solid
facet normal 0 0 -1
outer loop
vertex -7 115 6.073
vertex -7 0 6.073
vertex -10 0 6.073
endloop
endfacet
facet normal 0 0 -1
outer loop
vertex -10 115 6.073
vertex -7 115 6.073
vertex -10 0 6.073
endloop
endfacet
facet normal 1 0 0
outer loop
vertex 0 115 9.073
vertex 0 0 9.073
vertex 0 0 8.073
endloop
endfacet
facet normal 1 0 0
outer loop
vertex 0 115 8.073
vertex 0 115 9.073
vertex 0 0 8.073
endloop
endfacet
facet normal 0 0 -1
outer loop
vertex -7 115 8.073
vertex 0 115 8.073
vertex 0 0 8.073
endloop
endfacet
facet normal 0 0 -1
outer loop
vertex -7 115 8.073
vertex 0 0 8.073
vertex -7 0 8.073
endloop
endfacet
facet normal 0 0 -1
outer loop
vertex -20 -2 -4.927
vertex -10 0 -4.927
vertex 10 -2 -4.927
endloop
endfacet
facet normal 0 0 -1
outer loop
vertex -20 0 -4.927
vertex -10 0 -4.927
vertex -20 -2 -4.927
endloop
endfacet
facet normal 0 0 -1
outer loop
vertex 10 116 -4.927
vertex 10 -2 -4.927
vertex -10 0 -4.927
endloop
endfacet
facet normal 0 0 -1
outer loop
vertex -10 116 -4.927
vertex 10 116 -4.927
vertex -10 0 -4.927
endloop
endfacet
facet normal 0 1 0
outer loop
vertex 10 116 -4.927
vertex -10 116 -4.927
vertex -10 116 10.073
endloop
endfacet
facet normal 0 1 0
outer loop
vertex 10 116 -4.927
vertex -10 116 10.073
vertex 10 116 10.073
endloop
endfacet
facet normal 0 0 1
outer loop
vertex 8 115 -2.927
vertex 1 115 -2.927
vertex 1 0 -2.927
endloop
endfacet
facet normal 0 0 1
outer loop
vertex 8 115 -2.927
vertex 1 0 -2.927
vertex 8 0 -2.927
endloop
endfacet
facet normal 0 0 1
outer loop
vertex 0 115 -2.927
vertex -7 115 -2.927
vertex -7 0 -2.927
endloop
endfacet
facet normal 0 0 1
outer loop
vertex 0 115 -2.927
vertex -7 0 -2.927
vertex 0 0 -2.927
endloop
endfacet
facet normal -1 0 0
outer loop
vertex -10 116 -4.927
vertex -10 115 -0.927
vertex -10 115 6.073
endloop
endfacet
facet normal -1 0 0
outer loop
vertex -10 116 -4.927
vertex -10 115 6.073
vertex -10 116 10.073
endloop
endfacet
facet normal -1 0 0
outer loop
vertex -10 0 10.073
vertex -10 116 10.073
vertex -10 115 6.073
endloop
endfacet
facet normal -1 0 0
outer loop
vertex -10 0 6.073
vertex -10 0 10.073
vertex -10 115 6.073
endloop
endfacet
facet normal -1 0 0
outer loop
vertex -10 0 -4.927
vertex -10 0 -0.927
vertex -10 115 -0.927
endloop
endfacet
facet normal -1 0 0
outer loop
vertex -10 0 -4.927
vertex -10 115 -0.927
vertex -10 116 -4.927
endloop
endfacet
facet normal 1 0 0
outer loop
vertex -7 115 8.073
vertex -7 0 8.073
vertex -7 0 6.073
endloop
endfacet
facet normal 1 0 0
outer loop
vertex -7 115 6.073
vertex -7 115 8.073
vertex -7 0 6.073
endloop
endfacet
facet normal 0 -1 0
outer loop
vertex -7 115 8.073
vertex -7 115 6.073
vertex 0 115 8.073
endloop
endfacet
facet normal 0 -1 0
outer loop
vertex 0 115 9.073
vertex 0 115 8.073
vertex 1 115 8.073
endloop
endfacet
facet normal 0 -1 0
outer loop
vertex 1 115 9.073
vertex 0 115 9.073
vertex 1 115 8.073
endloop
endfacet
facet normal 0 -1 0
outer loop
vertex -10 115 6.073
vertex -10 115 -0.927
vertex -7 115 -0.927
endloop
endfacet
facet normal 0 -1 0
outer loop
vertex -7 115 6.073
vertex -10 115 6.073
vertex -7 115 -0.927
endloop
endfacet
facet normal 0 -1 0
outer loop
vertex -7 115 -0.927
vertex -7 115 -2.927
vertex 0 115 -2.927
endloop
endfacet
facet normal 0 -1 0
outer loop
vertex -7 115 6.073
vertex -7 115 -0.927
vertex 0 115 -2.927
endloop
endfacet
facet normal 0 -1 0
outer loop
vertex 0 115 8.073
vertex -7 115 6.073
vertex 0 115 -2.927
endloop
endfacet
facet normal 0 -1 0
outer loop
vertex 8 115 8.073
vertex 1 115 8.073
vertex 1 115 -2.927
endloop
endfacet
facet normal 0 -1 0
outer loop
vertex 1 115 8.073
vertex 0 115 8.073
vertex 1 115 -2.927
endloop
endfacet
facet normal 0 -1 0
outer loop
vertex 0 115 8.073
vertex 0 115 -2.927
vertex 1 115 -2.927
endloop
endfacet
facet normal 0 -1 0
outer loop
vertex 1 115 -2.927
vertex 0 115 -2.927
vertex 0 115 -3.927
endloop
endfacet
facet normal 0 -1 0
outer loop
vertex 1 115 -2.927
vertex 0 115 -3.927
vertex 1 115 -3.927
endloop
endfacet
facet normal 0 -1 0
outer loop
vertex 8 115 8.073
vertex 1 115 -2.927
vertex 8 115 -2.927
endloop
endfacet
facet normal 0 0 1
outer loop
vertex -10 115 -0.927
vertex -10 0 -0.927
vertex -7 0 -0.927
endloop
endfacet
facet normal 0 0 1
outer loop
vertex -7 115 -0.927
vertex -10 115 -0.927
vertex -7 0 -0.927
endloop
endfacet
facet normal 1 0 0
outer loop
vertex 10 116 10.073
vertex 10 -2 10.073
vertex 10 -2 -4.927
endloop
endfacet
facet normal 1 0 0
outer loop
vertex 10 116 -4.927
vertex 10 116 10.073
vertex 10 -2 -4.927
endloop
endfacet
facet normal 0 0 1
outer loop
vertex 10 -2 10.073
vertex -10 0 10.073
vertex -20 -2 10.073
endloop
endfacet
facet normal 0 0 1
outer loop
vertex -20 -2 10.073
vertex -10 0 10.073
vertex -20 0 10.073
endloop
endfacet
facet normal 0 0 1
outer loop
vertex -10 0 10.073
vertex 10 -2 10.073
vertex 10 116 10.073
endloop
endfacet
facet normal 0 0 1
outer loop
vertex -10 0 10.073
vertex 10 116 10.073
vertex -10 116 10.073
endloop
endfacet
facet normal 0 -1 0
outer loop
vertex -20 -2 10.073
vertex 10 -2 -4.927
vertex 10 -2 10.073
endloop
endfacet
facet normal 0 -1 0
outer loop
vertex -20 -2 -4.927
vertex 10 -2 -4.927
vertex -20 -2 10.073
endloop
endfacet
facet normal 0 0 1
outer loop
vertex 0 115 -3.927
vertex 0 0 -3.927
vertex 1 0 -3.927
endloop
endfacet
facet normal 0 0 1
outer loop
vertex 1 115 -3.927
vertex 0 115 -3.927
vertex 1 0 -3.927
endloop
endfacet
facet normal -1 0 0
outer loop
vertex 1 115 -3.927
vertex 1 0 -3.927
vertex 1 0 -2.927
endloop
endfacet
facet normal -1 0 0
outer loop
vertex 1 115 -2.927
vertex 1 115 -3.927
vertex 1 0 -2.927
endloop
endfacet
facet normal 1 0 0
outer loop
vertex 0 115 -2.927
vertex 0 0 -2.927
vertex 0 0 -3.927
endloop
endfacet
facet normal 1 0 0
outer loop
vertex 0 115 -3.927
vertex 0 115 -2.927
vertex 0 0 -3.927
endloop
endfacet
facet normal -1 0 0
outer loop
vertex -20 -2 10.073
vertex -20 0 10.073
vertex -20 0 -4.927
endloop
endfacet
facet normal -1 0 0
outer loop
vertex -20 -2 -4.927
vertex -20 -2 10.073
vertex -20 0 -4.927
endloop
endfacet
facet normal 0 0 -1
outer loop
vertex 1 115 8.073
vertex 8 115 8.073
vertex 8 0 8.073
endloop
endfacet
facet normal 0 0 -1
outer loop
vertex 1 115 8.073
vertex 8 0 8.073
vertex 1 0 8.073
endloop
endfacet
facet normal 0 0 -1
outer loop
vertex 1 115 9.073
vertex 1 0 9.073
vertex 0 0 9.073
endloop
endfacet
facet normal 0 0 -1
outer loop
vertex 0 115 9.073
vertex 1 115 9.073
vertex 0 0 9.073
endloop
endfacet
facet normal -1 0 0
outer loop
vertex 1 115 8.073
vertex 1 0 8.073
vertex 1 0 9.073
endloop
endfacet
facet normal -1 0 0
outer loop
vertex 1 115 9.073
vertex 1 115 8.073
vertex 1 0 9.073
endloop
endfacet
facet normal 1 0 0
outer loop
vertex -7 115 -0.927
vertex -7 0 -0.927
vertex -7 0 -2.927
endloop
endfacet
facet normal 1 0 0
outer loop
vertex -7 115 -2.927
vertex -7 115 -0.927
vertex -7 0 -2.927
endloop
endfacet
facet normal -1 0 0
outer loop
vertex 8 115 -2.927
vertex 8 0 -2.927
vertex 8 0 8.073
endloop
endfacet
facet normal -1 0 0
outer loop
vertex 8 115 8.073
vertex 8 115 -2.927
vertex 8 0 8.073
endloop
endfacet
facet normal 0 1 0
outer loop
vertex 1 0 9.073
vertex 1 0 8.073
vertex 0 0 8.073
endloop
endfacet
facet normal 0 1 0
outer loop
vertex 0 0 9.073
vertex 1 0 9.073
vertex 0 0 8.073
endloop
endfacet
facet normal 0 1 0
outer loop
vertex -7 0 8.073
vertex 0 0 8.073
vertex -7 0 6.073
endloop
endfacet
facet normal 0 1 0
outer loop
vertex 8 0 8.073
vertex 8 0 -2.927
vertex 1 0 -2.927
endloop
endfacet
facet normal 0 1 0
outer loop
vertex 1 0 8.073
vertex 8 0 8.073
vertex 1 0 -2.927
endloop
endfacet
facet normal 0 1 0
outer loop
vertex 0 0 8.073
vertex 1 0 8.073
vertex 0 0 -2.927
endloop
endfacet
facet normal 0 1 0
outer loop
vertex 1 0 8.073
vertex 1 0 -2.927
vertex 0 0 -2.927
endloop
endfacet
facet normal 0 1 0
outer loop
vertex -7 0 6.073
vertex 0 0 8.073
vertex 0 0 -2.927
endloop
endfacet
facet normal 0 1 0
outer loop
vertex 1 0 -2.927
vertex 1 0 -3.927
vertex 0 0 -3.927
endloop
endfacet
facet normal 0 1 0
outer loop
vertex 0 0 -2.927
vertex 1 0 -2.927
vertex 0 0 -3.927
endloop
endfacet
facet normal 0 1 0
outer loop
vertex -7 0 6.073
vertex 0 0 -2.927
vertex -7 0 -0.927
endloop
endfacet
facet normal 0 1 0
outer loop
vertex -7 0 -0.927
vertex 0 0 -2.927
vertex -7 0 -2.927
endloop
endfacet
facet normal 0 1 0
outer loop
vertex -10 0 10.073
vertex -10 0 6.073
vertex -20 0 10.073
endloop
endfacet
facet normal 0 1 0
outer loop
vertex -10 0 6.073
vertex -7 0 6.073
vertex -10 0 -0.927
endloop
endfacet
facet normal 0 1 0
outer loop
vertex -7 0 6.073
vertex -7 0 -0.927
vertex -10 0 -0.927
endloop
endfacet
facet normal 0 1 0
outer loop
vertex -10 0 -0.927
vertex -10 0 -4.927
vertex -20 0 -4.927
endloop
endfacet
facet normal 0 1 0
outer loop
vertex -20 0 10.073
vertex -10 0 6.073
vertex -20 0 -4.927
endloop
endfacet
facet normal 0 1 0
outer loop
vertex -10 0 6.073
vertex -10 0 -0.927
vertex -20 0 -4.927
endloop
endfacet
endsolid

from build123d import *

# Parameters (mm, degrees)
BOSS_EXTRUDE1_DEPTH = 115
SKETCH3_W           = 20
SKETCH3_H           = 15
BOSS_EXTRUDE2_DEPTH = 1
SKETCH7_W           = 30
SKETCH7_H           = 15
BOSS_EXTRUDE5_DEPTH = 2


with BuildPart() as part:
    # Sketch2 → Boss-Extrude1 (new body)
    with BuildSketch(Plane(origin=(0, 0, 0), x_dir=(1, 0, 0), z_dir=(0, 1, 0))):
        Polygon((-10, 4.926686322), (-10, 0.926686322), (-7, 0.926686322), (-7, 2.926686322), (0, 2.926686322), (0, 3.926686322), (1, 3.926686322), (1, 2.926686322), (8, 2.926686322), (8, -8.073313678), (1, -8.073313678), (1, -9.073313678), (0, -9.073313678), (0, -8.073313678), (-7, -8.073313678), (-7, -6.073313678), (-10, -6.073313678), (-10, -10.073313678), (10, -10.073313678), (10, 4.926686322), align=None)
    extrude(amount=BOSS_EXTRUDE1_DEPTH)

    # Sketch3 → Boss-Extrude2 (add)
    with BuildSketch(Plane(origin=(0, 115, 0), x_dir=(1, 0, 0), z_dir=(0, 1, 0))):
        with Locations((0, -2.573313678)):
            Rectangle(SKETCH3_W, SKETCH3_H)
    extrude(amount=BOSS_EXTRUDE2_DEPTH)

    # Sketch7 → Boss-Extrude5 (add)
    with BuildSketch(Plane(origin=(0, 0, 0), x_dir=(-1, 0, 0), z_dir=(0, -1, 0))):
        with Locations((5, -2.573313678)):
            Rectangle(SKETCH7_W, SKETCH7_H)
    extrude(amount=BOSS_EXTRUDE5_DEPTH)


solid = part.part
